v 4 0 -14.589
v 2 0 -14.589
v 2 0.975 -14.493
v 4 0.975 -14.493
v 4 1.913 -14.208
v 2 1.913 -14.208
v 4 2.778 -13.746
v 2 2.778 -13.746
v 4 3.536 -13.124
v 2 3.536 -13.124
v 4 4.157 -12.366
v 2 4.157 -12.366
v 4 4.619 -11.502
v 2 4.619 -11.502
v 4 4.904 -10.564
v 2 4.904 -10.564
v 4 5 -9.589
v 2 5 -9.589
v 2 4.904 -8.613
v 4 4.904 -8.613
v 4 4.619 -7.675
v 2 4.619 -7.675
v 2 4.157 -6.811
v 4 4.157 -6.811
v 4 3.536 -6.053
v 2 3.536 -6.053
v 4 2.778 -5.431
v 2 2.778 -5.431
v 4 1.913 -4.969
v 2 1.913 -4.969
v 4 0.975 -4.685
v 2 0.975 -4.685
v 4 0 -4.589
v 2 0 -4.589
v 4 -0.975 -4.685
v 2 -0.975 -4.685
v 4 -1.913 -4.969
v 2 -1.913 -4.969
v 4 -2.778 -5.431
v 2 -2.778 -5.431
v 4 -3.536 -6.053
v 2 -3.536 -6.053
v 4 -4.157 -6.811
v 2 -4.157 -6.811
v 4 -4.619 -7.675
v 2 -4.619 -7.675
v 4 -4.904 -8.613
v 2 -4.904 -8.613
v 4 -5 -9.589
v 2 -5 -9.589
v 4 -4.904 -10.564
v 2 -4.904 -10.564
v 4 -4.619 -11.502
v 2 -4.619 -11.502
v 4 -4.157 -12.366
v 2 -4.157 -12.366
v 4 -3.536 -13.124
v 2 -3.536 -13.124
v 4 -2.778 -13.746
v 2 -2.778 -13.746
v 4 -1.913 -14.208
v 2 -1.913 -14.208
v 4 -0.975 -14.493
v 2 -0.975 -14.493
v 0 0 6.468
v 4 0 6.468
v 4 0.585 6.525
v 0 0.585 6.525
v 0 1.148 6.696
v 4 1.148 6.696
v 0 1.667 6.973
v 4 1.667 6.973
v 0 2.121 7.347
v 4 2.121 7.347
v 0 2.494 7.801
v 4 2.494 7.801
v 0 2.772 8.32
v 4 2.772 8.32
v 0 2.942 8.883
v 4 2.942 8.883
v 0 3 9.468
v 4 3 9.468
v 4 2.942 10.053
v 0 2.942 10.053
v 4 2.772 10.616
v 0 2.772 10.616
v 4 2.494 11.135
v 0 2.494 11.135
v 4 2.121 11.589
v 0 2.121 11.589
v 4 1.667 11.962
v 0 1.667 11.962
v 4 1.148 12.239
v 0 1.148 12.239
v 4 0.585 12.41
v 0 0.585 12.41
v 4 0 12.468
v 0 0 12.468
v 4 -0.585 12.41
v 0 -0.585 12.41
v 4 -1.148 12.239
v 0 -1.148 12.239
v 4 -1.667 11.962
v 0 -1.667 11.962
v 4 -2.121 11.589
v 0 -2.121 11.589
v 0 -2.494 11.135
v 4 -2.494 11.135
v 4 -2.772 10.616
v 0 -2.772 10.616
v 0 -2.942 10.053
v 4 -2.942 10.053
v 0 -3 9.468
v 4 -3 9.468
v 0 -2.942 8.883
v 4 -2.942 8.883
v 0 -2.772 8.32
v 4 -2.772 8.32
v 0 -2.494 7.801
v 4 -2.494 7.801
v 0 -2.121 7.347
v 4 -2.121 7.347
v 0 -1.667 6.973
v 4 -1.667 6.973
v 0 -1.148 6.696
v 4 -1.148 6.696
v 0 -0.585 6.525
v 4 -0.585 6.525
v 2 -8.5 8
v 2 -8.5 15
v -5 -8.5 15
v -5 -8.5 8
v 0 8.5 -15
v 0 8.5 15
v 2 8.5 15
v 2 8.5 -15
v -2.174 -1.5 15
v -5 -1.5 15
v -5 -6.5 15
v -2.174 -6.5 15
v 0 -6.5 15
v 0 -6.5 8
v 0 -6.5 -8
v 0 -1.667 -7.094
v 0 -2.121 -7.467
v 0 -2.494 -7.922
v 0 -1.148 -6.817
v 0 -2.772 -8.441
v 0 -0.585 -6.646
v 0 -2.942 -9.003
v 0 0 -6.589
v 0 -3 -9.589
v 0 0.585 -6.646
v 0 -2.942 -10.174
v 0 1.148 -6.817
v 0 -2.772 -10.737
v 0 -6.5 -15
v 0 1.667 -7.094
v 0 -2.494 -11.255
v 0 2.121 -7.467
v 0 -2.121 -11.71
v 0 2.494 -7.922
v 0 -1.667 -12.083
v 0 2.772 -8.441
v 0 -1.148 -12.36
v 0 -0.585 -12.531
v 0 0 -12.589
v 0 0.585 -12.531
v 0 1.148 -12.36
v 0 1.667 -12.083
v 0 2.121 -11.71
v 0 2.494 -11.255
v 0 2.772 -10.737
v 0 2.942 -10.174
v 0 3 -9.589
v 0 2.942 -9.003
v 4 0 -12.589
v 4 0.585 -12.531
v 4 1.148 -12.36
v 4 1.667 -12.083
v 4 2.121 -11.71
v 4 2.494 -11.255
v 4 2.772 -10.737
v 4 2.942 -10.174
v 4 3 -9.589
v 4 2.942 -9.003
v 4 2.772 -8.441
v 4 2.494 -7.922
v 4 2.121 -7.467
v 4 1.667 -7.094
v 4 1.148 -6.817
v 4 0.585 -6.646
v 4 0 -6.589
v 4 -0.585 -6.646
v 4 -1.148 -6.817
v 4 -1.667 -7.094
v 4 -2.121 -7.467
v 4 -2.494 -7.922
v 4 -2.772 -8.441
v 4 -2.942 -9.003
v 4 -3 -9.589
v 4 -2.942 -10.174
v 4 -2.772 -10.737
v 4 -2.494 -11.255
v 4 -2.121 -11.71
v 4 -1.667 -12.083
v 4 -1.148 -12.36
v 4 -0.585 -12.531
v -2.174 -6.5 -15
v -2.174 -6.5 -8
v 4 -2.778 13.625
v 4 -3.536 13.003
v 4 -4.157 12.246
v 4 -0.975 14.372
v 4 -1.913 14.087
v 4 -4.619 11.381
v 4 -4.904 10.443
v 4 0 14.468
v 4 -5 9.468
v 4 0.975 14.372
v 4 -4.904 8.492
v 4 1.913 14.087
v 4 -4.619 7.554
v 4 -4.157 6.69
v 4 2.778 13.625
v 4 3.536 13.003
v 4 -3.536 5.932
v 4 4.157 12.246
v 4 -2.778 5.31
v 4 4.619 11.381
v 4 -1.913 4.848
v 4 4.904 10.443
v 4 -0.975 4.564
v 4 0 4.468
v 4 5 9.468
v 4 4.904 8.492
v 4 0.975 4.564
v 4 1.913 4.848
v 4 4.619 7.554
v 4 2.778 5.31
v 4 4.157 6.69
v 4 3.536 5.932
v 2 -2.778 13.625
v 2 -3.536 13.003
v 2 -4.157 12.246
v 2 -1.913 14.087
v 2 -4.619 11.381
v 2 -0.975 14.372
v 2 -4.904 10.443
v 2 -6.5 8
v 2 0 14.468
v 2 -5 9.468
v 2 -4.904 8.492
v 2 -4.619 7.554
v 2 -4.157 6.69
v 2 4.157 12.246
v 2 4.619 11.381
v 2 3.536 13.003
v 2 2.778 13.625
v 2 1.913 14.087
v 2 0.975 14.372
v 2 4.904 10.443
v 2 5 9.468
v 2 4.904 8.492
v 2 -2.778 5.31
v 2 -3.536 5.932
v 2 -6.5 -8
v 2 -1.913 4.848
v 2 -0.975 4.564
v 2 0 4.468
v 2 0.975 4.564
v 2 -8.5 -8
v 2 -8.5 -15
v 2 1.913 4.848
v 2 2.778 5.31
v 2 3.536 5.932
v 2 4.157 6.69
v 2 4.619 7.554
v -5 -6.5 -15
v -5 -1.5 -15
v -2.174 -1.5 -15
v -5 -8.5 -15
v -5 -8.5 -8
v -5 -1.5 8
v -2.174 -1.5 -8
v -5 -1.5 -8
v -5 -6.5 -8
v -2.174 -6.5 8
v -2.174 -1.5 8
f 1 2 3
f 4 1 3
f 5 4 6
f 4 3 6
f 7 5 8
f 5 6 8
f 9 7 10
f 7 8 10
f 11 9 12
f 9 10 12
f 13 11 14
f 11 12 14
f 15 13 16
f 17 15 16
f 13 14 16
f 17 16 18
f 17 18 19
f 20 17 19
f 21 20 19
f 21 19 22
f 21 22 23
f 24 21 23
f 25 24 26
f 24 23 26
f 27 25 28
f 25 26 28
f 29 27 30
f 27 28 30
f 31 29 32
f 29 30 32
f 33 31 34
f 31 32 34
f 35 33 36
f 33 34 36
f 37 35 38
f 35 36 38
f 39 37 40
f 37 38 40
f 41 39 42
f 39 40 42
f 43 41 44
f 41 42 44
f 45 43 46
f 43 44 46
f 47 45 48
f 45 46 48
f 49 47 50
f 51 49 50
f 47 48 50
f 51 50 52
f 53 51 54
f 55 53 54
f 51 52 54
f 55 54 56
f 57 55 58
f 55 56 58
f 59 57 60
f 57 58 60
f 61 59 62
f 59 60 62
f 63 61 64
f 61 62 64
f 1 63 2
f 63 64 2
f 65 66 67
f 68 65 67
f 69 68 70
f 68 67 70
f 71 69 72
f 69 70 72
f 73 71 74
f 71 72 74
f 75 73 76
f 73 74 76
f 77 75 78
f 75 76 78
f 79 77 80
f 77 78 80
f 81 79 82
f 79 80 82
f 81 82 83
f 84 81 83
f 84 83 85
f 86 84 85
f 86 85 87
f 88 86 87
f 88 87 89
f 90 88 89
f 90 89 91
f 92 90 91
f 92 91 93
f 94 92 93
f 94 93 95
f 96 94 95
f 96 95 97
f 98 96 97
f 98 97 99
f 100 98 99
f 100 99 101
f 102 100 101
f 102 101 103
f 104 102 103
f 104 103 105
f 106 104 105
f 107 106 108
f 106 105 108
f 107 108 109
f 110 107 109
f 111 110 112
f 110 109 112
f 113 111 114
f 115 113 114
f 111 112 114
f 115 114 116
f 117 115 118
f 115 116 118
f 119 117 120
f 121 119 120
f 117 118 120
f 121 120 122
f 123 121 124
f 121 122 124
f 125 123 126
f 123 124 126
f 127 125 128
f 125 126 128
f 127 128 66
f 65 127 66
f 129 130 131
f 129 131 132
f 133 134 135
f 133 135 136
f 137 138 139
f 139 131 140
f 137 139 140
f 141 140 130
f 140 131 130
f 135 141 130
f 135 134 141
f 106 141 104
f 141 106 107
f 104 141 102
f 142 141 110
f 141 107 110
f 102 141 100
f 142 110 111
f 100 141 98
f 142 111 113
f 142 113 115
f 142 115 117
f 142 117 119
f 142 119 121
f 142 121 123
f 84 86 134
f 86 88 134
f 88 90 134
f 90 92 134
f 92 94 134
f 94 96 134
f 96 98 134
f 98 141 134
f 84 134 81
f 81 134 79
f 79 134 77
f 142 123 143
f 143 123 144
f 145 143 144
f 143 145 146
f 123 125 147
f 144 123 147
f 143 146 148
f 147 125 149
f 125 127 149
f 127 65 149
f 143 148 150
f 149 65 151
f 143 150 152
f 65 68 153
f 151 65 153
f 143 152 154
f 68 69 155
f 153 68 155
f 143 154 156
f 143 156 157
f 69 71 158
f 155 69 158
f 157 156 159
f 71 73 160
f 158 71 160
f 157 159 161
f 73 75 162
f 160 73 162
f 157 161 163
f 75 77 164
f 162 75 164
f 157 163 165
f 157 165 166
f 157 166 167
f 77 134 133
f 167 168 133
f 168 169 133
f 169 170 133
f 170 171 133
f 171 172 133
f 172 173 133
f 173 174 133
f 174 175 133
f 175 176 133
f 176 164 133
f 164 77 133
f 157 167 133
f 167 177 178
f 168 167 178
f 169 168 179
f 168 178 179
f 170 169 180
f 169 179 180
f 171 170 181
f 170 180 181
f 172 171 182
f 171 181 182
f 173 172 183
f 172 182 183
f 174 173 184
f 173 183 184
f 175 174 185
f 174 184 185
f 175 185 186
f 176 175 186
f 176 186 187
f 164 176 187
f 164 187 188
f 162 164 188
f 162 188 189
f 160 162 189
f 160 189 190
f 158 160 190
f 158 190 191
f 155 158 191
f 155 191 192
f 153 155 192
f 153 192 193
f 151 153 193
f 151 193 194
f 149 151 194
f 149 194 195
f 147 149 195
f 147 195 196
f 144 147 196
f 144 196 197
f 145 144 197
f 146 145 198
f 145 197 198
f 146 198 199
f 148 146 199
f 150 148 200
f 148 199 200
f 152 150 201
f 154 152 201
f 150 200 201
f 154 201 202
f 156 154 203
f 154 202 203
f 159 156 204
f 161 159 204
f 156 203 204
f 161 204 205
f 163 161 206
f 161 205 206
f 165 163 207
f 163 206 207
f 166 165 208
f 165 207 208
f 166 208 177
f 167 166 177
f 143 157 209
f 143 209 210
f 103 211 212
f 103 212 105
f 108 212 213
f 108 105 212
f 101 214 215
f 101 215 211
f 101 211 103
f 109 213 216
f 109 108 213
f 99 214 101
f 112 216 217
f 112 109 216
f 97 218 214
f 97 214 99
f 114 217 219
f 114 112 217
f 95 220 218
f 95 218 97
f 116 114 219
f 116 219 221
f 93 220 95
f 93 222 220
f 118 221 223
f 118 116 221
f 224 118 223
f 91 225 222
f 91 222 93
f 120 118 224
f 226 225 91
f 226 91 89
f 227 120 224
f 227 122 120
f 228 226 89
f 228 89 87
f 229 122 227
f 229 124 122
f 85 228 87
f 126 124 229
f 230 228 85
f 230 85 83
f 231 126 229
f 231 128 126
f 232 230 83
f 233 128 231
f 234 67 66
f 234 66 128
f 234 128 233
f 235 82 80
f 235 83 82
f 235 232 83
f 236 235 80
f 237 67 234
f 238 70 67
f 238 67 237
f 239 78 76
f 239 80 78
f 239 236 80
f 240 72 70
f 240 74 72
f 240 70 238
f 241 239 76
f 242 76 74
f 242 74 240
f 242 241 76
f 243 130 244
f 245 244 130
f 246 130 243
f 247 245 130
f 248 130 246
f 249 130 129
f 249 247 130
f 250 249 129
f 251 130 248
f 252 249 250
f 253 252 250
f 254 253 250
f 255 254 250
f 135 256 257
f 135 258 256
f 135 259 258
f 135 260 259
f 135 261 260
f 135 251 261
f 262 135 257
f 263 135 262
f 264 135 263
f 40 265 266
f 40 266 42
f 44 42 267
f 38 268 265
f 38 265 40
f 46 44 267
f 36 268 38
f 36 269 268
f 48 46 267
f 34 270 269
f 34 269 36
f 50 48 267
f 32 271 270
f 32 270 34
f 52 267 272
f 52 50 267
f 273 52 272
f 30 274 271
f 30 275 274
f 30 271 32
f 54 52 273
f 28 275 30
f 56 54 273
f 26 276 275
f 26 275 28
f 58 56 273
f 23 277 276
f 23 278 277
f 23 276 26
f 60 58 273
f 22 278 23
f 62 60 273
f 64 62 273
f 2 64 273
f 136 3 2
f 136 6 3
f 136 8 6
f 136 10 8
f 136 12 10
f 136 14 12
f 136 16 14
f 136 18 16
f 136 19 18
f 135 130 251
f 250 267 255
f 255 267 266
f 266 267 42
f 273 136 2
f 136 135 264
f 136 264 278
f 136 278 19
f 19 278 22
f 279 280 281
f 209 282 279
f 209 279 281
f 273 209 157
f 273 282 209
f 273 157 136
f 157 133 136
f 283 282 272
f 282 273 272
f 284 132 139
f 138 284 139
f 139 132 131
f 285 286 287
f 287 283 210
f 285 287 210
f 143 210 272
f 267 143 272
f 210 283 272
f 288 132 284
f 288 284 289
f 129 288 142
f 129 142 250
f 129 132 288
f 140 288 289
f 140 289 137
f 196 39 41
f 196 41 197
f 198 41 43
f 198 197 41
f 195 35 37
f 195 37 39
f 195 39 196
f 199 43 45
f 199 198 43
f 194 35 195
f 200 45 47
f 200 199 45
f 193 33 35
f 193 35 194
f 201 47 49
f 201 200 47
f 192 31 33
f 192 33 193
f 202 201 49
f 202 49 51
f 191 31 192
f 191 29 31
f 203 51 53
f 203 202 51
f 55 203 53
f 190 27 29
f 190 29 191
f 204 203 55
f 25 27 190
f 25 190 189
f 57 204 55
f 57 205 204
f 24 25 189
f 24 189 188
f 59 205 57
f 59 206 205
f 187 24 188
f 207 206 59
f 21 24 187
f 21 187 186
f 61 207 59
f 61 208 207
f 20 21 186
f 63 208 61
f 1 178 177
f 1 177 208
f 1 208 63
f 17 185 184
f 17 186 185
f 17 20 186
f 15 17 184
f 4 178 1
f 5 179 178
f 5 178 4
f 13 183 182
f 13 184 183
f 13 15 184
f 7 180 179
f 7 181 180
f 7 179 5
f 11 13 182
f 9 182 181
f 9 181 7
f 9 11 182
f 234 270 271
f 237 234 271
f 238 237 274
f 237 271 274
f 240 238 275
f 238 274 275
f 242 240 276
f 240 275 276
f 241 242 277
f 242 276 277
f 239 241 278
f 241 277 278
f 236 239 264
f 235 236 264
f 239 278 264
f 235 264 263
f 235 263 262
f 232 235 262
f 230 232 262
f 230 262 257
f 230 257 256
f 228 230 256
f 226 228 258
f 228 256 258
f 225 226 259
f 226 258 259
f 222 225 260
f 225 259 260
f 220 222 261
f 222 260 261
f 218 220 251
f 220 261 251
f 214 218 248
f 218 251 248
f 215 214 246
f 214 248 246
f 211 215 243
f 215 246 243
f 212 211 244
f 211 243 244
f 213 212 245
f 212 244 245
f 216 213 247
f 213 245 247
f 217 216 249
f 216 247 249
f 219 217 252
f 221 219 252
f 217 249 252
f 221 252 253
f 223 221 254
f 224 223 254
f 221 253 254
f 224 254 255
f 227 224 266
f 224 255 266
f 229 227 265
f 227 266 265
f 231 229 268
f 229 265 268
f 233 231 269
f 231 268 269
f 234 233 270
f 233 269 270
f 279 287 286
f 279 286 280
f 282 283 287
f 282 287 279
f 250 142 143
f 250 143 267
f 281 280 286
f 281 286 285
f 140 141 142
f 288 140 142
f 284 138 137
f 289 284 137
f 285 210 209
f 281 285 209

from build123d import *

# Parameters (mm, degrees)
ESQUISSE1_W             = 30
ESQUISSE1_H             = 17
BOSS_EXTRU_1_DEPTH      = 2
ESQUISSE2_R             = 5
BOSS_EXTRU_2_DEPTH      = 2
ESQUISSE3_R             = 3
ENL_V_MAT_EXTRU_1_DEPTH = 18.69887002
ESQUISSE4_R             = 3
ENL_V_MAT_EXTRU_2_DEPTH = 18.69887002
ESQUISSE7_W             = 2
ESQUISSE7_H             = 8
ENL_V_MAT_EXTRU_3_DEPTH = 2
ESQUISSE8_W             = 7
ESQUISSE8_H             = 2
BOSS_EXTRU_3_DEPTH      = 5
ESQUISSE12_W            = 2.825864409
ESQUISSE12_H            = 7
BOSS_EXTRU_4_DEPTH      = 5


with BuildPart() as part:
    # Esquisse1 → Boss.-Extru.1 (new body)
    with BuildSketch(Plane(origin=(0, 0, 0), x_dir=(0, 0, -1), z_dir=(1, 0, 0))):
        Rectangle(ESQUISSE1_W, ESQUISSE1_H)
    extrude(amount=BOSS_EXTRU_1_DEPTH)

    # Esquisse2 → Boss.-Extru.2 (add)
    with BuildSketch(Plane(origin=(2, 0, 0), x_dir=(0, 0, -1), z_dir=(1, 0, 0))):
        with Locations((-9.467846224, 0)):
            Circle(ESQUISSE2_R)
        with Locations((9.588622493, 0)):
            Circle(ESQUISSE2_R)
    extrude(amount=BOSS_EXTRU_2_DEPTH)

    # Esquisse3 → Enlèv. mat.-Extru.1 (cut, through all)
    with BuildSketch(Plane(origin=(4, 0, 0), x_dir=(0, 0, -1), z_dir=(1, 0, 0))):
        with Locations((-9.467846224, 0)):
            Circle(ESQUISSE3_R)
    extrude(amount=-ENL_V_MAT_EXTRU_1_DEPTH, mode=Mode.SUBTRACT)

    # Esquisse4 → Enlèv. mat.-Extru.2 (cut, through all)
    with BuildSketch(Plane(origin=(4, 0, 0), x_dir=(0, 0, -1), z_dir=(1, 0, 0))):
        with Locations((9.588622493, 0)):
            Circle(ESQUISSE4_R)
    extrude(amount=-ENL_V_MAT_EXTRU_2_DEPTH, mode=Mode.SUBTRACT)

    # Esquisse7 → Enlèv. mat.-Extru.3 (cut)
    with BuildSketch(Plane.XZ.offset(8.5)):
        with Locations((1, 4)):
            Rectangle(ESQUISSE7_W, ESQUISSE7_H)
    enl_v_mat_extru_3 = extrude(amount=-ENL_V_MAT_EXTRU_3_DEPTH, mode=Mode.SUBTRACT)

    # Symétrie1: Enlèv. mat.-Extru.3 across plane
    add(enl_v_mat_extru_3.mirror(Plane.XY), mode=Mode.SUBTRACT)

    # Esquisse8 → Boss.-Extru.3 (add)
    with BuildSketch(Plane.ZY):
        with Locations((-11.5, -7.5)):
            Rectangle(ESQUISSE8_W, ESQUISSE8_H)
    boss_extru_3 = extrude(amount=BOSS_EXTRU_3_DEPTH)

    # Esquisse12 → Boss.-Extru.4 (add)
    with BuildSketch(Plane(origin=(0, -6.5, 0), x_dir=(1, 0, 0), z_dir=(0, 1, 0))):
        with Locations((-3.587067796, 11.5)):
            Rectangle(ESQUISSE12_W, ESQUISSE12_H)
    boss_extru_4 = extrude(amount=BOSS_EXTRU_4_DEPTH)

    # Symétrie2: Boss.-Extru.3, Boss.-Extru.4 across plane
    add(boss_extru_3.mirror(Plane.XY))
    add(boss_extru_4.mirror(Plane.XY))


solid = part.part
